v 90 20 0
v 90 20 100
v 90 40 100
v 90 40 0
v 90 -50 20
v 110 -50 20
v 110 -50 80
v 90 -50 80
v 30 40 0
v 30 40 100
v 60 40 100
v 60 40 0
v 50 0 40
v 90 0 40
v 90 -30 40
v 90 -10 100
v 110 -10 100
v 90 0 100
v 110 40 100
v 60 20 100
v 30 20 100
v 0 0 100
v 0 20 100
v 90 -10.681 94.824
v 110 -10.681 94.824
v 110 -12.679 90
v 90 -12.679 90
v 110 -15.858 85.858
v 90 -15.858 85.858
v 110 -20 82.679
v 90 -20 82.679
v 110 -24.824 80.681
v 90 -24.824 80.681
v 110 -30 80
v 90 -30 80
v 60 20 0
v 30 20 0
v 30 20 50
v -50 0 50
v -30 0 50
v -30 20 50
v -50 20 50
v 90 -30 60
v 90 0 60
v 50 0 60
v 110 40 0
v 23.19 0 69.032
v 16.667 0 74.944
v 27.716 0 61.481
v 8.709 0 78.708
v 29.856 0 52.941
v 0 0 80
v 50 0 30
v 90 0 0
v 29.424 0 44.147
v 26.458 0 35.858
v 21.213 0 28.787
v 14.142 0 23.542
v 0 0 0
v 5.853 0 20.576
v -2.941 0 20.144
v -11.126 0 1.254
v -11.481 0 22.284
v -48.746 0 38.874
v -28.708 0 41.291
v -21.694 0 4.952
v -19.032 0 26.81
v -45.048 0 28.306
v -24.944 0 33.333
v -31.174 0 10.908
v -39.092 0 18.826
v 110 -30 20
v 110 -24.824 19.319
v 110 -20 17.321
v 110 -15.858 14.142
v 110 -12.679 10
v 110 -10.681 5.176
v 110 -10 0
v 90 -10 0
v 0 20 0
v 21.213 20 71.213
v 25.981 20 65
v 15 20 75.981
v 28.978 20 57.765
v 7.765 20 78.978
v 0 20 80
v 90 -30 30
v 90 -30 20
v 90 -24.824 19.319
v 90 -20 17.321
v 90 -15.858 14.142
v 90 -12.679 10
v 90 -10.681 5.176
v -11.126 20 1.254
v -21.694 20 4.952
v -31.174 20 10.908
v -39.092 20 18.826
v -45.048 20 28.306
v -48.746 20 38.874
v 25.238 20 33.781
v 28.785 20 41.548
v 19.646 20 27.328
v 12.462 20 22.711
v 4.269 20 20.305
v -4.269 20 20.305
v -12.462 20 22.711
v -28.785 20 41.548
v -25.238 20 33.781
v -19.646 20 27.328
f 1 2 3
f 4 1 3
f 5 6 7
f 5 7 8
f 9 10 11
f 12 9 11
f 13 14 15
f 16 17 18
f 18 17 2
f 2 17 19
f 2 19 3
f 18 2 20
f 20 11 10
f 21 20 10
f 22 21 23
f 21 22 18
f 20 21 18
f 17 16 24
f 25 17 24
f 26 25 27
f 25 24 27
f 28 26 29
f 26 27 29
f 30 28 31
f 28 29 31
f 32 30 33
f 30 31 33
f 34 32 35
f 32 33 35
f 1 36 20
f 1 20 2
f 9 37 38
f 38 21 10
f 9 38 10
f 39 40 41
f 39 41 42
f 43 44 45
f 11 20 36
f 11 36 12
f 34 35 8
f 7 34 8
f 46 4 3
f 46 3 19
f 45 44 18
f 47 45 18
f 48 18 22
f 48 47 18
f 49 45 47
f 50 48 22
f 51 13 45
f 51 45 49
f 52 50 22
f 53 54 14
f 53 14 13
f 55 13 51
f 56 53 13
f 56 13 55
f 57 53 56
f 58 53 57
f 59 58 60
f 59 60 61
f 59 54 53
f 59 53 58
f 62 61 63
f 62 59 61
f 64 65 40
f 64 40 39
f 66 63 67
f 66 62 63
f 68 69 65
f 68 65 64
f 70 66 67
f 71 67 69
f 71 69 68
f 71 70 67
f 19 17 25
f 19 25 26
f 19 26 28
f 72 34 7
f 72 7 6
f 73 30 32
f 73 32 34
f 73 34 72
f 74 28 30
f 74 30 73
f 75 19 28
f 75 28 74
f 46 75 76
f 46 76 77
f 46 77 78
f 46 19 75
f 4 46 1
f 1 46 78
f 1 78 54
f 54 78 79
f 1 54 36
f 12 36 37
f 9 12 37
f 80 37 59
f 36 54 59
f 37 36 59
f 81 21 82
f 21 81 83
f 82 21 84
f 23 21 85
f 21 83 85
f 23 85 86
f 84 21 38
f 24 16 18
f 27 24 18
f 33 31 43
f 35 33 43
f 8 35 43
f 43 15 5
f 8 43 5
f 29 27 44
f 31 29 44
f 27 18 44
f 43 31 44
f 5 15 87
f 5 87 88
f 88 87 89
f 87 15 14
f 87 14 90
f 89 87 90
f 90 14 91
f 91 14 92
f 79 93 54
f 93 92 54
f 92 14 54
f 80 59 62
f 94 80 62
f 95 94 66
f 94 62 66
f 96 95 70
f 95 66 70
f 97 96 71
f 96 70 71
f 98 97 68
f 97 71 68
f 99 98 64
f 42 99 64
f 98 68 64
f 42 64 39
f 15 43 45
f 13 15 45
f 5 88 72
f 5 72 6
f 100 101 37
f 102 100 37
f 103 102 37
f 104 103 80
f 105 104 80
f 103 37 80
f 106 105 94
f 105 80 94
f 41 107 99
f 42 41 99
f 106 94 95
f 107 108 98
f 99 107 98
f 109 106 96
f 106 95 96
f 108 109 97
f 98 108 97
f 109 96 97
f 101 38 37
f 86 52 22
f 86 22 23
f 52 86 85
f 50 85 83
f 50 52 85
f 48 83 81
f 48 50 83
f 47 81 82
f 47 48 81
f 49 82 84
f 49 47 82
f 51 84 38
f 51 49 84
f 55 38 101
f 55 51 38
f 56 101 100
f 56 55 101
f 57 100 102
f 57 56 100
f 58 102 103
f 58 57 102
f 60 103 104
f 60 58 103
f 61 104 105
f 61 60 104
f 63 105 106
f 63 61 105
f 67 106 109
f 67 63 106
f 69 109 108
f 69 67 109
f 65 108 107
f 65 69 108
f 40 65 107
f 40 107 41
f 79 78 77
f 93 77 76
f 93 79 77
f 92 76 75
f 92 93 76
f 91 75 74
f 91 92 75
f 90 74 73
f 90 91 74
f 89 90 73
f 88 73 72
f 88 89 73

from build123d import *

# Parameters (mm, degrees)
SKETCH2_W           = 110
SKETCH2_H           = 40
BOSS_EXTRUDE1_DEPTH = 100
SKETCH3_W           = 30
SKETCH3_H           = 20
CUT_EXTRUDE1_DEPTH  = 100
SKETCH4_W           = 20
SKETCH4_H           = 100
BOSS_EXTRUDE3_DEPTH = 50
CUT_EXTRUDE2_DEPTH  = 50
SKETCH7_W           = 40
SKETCH7_H           = 20
BOSS_EXTRUDE4_DEPTH = 30
CUT_EXTRUDE3_DEPTH  = 30
SKETCH9_W           = 50
SKETCH9_H           = 50
BOSS_EXTRUDE5_DEPTH = 20
CUT_EXTRUDE5_DEPTH  = 20
CUT_EXTRUDE6_DEPTH  = 20


with BuildPart() as part:
    # Sketch2 → Boss-Extrude1 (new body)
    with BuildSketch(Plane.XY):
        with Locations((55, 20)):
            Rectangle(SKETCH2_W, SKETCH2_H)
    extrude(amount=BOSS_EXTRUDE1_DEPTH)

    # Sketch3 → Cut-Extrude1 (cut)
    with BuildSketch(Plane.XY.offset(100)):
        with Locations((75, 30)):
            Rectangle(SKETCH3_W, SKETCH3_H)
        with Locations((15, 30)):
            Rectangle(SKETCH3_W, SKETCH3_H)
    extrude(amount=-CUT_EXTRUDE1_DEPTH, mode=Mode.SUBTRACT)

    # Sketch4 → Boss-Extrude3 (add)
    with BuildSketch(Plane(origin=(0, 0, 0), x_dir=(-1, 0, 0), z_dir=(0, -1, 0))):
        with Locations((-100, -50)):
            Rectangle(SKETCH4_W, SKETCH4_H)
    extrude(amount=BOSS_EXTRUDE3_DEPTH)

    # Sketch6 → Cut-Extrude2 (cut)
    with BuildSketch(Plane.ZY.offset(-90)):
        with BuildLine():
            Line((80, -30), (80, -50))
            Line((80, -50), (100, -50))
            Line((100, -50), (100, -10))
            ThreePointArc((100, -10), (85.857864376, -15.857864376), (80, -30))
        make_face()
        with BuildLine():
            Line((20, -30), (20, -50))
            Line((20, -50), (0, -50))
            Line((0, -50), (0, -10))
            ThreePointArc((0, -10), (14.142135624, -15.857864376), (20, -30))
        make_face()
    extrude(amount=-CUT_EXTRUDE2_DEPTH, mode=Mode.SUBTRACT)

    # Sketch7 → Boss-Extrude4 (add)
    with BuildSketch(Plane(origin=(0, 0, 0), x_dir=(-1, 0, 0), z_dir=(0, -1, 0))):
        with Locations((-70, -50)):
            Rectangle(SKETCH7_W, SKETCH7_H)
    extrude(amount=BOSS_EXTRUDE4_DEPTH)

    # Sketch8 → Cut-Extrude3 (cut)
    with BuildSketch(Plane.XY.offset(60)):
        Polygon((90, -30), (50, 0), (50, -30), align=None)
    extrude(amount=-CUT_EXTRUDE3_DEPTH, mode=Mode.SUBTRACT)

    # Sketch9 → Boss-Extrude5 (add)
    with BuildSketch(Plane(origin=(0, 0, 0), x_dir=(-1, 0, 0), z_dir=(0, -1, 0))):
        with Locations((25, -25)):
            Rectangle(SKETCH9_W, SKETCH9_H)
    extrude(amount=-BOSS_EXTRUDE5_DEPTH)

    # Sketch10 → Cut-Extrude5 (cut)
    with BuildSketch(Plane(origin=(0, 0, 0), x_dir=(-1, 0, 0), z_dir=(0, -1, 0))):
        with BuildLine():
            Line((30, -50), (0, -50))
            Line((0, -50), (0, -80))
            ThreePointArc((0, -80), (-21.213203436, -28.786796564), (30, -50))
        make_face()
    extrude(amount=-CUT_EXTRUDE5_DEPTH, mode=Mode.SUBTRACT)

    # Sketch12 → Cut-Extrude6 (cut)
    with BuildSketch(Plane(origin=(0, 0, 0), x_dir=(-1, 0, 0), z_dir=(0, -1, 0))):
        with BuildLine():
            Line((50, -50), (50, 0))
            Line((50, 0), (0, 0))
            ThreePointArc((0, 0), (35.355339059, -14.644660941), (50, -50))
        make_face()
    extrude(amount=-CUT_EXTRUDE6_DEPTH, mode=Mode.SUBTRACT)


solid = part.part
